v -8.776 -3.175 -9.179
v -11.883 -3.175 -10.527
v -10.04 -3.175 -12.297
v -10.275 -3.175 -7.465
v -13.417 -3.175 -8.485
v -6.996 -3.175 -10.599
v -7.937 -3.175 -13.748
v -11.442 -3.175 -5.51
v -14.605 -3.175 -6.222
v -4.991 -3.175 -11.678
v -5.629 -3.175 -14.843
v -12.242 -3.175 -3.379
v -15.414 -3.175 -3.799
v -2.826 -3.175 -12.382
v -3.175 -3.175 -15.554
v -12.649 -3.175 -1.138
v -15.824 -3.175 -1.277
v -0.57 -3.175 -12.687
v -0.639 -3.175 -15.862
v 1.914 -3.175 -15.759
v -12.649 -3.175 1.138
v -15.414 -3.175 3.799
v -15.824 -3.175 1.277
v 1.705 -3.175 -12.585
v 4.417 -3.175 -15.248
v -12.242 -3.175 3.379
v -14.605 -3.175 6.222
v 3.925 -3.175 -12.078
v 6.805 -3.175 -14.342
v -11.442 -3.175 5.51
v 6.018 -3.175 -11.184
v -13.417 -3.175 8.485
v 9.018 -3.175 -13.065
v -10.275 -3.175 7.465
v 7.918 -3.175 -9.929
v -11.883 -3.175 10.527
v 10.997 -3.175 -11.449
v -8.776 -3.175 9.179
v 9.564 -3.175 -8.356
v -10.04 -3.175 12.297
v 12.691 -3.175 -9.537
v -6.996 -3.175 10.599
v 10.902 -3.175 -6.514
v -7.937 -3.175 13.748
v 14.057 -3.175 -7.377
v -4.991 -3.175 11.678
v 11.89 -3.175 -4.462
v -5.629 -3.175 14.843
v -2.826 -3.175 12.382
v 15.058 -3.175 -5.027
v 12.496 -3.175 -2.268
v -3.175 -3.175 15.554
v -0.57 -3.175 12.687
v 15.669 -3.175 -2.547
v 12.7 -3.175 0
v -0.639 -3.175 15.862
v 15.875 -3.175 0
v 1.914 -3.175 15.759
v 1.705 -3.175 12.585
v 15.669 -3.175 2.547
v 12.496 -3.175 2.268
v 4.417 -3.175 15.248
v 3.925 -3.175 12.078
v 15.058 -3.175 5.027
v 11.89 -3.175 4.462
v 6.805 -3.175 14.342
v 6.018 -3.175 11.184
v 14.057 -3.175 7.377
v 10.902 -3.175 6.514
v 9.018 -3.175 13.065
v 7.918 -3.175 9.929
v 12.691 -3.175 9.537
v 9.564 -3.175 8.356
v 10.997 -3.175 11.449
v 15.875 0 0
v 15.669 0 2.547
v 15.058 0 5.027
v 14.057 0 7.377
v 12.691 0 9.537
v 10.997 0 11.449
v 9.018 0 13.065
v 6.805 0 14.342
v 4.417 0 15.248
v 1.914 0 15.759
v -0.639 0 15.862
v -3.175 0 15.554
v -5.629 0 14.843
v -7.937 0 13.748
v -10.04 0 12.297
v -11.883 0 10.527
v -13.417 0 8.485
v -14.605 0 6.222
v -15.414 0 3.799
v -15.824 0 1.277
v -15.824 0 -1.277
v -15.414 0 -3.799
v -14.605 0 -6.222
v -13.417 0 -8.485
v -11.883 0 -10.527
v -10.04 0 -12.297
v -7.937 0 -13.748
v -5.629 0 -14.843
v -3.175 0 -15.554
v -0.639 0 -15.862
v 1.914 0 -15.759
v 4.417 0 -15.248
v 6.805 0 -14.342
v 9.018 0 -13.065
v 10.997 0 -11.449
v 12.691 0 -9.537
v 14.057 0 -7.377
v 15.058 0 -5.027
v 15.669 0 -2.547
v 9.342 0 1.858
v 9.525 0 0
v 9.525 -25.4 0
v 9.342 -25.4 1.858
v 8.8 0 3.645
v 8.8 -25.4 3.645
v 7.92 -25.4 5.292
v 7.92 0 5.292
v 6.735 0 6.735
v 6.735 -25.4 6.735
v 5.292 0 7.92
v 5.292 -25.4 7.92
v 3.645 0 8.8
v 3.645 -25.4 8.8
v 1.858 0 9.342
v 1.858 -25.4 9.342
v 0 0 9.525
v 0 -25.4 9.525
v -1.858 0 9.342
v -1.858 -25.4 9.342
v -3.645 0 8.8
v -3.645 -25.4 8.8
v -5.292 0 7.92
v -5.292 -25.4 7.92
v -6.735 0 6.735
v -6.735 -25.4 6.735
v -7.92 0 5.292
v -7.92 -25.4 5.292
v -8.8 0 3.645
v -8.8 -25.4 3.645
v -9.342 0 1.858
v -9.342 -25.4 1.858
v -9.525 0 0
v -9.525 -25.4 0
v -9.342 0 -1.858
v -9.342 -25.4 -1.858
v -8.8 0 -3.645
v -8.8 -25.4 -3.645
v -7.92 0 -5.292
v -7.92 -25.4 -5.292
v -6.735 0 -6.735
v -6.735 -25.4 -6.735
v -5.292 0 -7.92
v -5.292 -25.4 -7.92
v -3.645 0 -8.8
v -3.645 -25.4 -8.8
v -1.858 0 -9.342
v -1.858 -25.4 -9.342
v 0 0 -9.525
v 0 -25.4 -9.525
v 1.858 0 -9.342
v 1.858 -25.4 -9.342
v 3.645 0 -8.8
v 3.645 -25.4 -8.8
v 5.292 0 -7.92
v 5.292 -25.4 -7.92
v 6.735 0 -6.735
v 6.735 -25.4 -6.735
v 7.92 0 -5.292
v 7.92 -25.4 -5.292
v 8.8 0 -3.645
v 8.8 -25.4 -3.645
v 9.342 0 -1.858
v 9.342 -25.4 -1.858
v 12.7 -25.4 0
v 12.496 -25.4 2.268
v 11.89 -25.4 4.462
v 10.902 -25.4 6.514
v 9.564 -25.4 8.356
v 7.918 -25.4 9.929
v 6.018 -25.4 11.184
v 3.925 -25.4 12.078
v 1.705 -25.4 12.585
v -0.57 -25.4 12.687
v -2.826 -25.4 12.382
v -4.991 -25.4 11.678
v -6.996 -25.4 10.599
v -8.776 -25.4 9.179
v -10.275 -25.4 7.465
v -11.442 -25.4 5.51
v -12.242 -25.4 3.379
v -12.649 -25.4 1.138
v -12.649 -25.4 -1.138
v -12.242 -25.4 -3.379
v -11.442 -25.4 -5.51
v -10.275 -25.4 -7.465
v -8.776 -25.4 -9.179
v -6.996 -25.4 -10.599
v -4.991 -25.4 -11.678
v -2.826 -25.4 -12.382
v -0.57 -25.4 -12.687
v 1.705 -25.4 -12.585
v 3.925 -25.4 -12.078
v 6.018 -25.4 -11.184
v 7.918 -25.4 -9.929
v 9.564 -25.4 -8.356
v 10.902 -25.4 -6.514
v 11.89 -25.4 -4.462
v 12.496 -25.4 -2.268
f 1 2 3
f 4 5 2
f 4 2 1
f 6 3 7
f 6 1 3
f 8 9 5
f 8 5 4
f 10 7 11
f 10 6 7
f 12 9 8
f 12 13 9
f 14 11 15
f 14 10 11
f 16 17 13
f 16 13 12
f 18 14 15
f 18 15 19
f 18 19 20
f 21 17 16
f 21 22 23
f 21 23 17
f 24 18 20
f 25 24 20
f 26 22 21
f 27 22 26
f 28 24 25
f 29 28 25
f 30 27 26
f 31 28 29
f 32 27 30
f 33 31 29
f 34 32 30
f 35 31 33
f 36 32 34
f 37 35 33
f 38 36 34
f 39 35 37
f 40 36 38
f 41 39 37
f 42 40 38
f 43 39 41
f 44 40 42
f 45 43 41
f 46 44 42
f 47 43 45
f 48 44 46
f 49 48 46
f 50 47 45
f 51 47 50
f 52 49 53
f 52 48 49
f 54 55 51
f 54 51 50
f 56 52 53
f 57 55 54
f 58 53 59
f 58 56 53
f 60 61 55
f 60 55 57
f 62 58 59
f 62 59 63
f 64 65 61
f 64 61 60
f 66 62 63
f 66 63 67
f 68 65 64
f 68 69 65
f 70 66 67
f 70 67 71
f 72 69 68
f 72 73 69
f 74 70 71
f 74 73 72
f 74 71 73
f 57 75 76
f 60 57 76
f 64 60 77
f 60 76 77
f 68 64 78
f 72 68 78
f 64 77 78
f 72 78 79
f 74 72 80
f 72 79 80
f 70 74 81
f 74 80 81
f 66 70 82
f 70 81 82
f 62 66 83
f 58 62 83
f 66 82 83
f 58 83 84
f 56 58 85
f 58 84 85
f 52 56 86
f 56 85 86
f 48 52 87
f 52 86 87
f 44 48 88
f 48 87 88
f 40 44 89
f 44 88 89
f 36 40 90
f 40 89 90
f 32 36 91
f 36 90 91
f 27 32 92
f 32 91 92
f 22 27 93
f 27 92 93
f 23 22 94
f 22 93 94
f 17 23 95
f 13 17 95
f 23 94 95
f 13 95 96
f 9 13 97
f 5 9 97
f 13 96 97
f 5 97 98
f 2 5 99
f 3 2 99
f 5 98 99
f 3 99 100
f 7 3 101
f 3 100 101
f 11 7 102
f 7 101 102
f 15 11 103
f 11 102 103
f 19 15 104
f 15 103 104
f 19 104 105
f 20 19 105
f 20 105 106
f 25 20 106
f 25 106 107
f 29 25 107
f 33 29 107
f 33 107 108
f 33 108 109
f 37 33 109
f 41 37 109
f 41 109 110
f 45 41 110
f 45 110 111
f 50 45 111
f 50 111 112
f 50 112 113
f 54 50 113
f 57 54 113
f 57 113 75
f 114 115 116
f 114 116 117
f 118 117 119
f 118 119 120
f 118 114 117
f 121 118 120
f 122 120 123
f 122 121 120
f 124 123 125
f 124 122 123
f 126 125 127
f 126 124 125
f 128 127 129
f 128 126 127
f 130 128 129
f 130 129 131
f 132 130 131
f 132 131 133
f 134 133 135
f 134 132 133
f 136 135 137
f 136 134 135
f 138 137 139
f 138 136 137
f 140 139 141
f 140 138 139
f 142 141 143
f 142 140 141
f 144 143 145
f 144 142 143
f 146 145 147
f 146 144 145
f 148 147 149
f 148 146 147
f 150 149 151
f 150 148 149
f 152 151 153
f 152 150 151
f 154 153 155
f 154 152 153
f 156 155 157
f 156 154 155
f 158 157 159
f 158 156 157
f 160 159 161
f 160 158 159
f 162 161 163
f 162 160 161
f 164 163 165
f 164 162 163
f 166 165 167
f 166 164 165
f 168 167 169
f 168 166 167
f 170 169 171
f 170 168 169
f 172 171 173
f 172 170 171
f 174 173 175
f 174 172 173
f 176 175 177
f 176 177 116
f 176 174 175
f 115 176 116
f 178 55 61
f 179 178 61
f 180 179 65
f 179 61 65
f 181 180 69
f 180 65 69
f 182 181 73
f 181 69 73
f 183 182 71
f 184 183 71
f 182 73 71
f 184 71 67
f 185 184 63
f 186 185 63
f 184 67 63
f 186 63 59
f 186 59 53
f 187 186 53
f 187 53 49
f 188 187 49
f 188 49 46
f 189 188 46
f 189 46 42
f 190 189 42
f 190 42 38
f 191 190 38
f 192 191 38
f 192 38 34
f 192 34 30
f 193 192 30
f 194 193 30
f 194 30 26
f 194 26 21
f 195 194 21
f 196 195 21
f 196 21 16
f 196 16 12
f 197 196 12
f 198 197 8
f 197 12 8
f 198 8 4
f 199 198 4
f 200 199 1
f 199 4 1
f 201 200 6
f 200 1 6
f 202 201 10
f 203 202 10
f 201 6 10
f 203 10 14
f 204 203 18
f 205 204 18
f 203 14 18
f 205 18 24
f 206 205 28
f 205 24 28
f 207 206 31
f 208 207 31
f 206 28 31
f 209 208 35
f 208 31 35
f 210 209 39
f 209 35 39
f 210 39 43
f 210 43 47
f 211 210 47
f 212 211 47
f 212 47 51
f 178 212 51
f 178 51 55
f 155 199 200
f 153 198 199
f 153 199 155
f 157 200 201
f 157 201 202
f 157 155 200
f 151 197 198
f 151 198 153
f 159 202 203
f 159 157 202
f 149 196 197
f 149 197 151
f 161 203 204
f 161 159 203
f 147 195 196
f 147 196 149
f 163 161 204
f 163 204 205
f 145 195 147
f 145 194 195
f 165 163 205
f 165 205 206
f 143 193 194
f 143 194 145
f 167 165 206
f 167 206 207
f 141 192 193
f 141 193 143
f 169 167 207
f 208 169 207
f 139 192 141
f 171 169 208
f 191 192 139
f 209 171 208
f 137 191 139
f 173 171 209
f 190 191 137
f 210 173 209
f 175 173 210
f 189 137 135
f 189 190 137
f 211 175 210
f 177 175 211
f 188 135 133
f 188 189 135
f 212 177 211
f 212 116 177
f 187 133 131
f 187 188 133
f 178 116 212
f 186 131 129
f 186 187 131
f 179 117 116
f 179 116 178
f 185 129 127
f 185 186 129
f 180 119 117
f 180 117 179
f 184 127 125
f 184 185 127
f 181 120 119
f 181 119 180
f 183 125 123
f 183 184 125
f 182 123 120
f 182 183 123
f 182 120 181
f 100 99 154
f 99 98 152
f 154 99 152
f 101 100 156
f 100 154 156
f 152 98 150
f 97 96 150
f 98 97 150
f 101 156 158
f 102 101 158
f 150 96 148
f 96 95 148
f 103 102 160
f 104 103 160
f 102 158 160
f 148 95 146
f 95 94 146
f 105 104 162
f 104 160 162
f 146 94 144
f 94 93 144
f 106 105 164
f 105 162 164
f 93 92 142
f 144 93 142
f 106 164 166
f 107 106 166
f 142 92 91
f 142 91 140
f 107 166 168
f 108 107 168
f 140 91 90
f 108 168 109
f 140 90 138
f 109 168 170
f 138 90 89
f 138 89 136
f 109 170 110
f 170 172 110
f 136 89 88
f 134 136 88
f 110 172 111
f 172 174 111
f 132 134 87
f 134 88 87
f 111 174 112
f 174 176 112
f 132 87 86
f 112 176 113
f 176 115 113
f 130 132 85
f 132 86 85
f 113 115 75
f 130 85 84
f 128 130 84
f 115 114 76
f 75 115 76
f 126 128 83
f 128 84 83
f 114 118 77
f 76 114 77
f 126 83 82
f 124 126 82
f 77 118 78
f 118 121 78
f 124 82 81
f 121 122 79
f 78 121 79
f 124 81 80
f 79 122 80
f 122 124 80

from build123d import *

# Parameters (mm, degrees)
F0_R     = 15.875
F3_DEPTH = 3.175
F1_R     = 12.7
F4_DEPTH = 25.4
F2_R     = 9.525
F5_DEPTH = 25.4


with BuildPart() as f3:
    # F0 (on Front) → F3 (new body)
    with BuildSketch(Plane.XZ):
        Circle(F0_R)
    extrude(amount=F3_DEPTH)

    # F1 (on Front) → F4 (join)
    with BuildSketch(Plane.XZ):
        Circle(F1_R)
    extrude(amount=F4_DEPTH)

    # F2 (on Front) → F5 (cut)
    with BuildSketch(Plane.XZ):
        Circle(F2_R)
    extrude(amount=F5_DEPTH, mode=Mode.SUBTRACT)


solid = f3.part
